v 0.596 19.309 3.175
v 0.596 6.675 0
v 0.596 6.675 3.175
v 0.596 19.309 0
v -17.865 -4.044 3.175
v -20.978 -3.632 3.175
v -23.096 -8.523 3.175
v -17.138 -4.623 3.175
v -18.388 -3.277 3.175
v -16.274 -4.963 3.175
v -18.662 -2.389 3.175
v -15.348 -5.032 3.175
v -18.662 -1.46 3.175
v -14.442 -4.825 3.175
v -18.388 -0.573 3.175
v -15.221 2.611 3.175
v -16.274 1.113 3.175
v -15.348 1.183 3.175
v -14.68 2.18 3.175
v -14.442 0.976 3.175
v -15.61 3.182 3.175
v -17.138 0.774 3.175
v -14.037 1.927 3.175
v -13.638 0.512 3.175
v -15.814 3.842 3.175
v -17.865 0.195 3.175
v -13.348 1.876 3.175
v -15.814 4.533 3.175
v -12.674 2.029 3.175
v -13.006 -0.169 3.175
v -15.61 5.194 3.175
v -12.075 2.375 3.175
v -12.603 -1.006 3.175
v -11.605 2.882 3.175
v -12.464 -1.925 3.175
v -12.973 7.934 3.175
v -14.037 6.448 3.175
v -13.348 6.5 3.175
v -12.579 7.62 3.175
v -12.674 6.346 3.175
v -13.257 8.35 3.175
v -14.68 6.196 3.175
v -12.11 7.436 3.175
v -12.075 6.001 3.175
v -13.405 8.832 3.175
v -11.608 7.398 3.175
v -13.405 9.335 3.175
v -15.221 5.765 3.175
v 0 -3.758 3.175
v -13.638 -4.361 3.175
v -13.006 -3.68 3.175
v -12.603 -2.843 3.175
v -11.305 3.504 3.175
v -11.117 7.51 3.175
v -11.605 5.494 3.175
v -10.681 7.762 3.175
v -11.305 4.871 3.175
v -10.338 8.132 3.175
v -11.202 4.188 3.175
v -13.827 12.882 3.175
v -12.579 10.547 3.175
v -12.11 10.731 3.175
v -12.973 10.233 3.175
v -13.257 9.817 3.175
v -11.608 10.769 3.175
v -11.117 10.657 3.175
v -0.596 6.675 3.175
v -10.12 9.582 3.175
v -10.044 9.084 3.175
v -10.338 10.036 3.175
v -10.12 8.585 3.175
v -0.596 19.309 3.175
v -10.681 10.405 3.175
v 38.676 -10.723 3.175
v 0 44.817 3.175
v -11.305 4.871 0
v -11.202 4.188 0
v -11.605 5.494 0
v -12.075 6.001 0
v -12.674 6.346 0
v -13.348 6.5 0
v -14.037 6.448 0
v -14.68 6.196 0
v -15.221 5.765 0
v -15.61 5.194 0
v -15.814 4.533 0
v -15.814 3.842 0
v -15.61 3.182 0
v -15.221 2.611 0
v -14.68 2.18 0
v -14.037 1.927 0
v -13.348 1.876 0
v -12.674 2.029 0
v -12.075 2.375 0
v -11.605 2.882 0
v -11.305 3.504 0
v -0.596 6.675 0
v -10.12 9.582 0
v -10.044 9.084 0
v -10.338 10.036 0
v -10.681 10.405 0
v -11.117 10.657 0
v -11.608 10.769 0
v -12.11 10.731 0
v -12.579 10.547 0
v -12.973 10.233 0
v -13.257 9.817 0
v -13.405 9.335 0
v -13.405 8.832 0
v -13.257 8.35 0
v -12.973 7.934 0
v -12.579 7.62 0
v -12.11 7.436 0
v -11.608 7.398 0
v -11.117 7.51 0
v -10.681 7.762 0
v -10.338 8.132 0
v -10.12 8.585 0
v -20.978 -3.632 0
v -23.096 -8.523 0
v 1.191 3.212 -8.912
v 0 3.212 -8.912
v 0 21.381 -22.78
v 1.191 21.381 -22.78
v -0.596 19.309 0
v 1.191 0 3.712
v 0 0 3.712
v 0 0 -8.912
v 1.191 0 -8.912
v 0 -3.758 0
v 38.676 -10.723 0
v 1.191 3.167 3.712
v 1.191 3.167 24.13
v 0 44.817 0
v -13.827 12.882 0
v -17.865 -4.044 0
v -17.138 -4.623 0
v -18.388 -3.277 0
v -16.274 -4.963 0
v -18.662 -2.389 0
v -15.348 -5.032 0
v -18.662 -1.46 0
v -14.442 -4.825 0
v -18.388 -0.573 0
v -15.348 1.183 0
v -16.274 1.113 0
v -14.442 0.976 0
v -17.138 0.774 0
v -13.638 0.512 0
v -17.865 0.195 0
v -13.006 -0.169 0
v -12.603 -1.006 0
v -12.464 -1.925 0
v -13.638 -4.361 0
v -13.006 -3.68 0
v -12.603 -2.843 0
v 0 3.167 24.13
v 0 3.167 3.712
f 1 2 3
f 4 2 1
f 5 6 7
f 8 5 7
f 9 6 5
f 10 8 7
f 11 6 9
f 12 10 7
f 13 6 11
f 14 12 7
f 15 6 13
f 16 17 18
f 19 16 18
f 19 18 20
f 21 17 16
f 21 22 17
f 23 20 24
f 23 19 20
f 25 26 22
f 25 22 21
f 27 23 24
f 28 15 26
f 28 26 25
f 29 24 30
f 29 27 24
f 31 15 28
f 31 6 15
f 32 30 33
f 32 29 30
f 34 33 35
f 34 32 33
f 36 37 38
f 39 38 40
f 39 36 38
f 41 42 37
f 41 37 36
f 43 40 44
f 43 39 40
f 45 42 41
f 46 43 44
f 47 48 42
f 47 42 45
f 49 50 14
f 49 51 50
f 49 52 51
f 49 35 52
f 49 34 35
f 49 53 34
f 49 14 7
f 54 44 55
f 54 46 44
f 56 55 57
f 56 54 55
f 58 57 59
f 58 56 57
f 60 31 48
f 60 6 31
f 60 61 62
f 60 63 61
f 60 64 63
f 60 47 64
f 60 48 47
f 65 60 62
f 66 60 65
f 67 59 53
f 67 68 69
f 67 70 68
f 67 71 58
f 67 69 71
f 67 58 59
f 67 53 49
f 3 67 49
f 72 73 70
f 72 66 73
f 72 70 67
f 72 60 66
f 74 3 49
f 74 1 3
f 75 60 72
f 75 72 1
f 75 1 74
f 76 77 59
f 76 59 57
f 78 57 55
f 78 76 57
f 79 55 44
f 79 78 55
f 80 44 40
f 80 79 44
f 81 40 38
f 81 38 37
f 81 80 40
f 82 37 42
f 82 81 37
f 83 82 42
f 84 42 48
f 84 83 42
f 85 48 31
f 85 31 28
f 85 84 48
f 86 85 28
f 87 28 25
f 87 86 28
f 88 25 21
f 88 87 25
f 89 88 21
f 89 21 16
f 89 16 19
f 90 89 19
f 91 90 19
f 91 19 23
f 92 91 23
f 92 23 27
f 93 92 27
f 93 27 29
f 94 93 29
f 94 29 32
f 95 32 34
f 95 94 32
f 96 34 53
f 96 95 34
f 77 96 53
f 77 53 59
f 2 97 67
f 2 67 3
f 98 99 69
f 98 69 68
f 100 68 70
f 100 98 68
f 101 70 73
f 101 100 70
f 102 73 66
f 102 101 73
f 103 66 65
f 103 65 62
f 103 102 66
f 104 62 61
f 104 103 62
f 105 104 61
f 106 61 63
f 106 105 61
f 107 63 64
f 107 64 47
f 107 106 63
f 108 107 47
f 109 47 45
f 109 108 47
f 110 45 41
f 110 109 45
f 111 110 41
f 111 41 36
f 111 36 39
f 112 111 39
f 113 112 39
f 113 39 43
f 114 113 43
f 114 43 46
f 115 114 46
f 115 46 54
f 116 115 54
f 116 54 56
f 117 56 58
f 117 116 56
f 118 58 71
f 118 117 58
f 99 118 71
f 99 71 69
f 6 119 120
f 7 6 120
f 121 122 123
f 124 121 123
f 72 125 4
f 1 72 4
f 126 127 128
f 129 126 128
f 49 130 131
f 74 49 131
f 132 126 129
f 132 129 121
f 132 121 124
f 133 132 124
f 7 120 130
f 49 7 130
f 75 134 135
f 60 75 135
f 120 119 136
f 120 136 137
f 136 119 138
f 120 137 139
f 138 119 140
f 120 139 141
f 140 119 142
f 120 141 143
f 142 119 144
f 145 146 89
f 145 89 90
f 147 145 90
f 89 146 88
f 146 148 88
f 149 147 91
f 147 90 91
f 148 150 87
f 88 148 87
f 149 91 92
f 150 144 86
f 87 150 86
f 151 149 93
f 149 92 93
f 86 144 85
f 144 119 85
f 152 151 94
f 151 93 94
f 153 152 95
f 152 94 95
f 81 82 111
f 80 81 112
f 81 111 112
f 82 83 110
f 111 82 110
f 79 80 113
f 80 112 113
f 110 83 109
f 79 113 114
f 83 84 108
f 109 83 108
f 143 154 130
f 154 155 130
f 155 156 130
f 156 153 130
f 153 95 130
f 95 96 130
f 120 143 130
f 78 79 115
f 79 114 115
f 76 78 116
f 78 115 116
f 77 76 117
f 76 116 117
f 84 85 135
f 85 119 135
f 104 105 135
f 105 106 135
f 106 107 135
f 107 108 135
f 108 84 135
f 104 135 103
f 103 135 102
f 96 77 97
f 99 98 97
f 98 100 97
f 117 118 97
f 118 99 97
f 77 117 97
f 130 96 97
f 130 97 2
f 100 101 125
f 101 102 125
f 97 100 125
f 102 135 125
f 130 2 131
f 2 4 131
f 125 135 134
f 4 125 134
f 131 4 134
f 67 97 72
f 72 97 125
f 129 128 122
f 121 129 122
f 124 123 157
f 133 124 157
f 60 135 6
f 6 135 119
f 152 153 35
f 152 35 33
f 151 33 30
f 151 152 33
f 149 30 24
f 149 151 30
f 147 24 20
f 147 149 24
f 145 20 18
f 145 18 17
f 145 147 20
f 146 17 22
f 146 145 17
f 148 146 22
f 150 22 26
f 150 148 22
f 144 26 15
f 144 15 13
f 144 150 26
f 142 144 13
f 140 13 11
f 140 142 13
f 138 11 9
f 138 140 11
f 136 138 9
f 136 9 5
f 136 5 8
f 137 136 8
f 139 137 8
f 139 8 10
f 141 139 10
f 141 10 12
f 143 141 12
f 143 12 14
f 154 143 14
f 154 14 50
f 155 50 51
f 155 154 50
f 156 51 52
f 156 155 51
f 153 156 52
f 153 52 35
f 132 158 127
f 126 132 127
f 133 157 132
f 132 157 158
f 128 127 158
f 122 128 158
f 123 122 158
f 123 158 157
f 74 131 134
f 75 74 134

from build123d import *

# Parameters (mm, degrees)
F0_R     = 3.116082
F0_R_2   = 2.318569
F0_R_3   = 1.689933
F0_W     = 1.191754
F0_H     = 12.633354
F1_DEPTH = 3.175
F3_DEPTH = 1.19126


with BuildPart() as f1:
    # F0 (on Top) → F1 (new body)
    with BuildSketch(Plane.XY):
        Polygon((38.676079, -10.722989), (0, 44.816598), (-13.827338, 12.882033), (-20.977833, -3.632203), (-23.095671, -8.523402), (0, -3.757629), align=None)
        with Locations((-15.580412, -1.924639)):
            Circle(F0_R, mode=Mode.SUBTRACT)
        with Locations((-13.520994, 4.187773)):
            Circle(F0_R_2, mode=Mode.SUBTRACT)
        with Locations((-11.734423, 9.083614)):
            Circle(F0_R_3, mode=Mode.SUBTRACT)
        with Locations((0, 12.992069)):
            Rectangle(F0_W, F0_H, mode=Mode.SUBTRACT)
    extrude(amount=F1_DEPTH)


with BuildPart() as f3:
    # F2 (on Right) → F3 (new body)
    with BuildSketch(Plane.YZ):
        Polygon((3.166777, 3.711562), (0, 3.711562), (0, -8.912238), (3.211547, -8.912238), (21.380514, -22.780178), (3.166777, 24.12953), align=None)
    extrude(amount=F3_DEPTH)


solid = Compound([f1.part, f3.part])
